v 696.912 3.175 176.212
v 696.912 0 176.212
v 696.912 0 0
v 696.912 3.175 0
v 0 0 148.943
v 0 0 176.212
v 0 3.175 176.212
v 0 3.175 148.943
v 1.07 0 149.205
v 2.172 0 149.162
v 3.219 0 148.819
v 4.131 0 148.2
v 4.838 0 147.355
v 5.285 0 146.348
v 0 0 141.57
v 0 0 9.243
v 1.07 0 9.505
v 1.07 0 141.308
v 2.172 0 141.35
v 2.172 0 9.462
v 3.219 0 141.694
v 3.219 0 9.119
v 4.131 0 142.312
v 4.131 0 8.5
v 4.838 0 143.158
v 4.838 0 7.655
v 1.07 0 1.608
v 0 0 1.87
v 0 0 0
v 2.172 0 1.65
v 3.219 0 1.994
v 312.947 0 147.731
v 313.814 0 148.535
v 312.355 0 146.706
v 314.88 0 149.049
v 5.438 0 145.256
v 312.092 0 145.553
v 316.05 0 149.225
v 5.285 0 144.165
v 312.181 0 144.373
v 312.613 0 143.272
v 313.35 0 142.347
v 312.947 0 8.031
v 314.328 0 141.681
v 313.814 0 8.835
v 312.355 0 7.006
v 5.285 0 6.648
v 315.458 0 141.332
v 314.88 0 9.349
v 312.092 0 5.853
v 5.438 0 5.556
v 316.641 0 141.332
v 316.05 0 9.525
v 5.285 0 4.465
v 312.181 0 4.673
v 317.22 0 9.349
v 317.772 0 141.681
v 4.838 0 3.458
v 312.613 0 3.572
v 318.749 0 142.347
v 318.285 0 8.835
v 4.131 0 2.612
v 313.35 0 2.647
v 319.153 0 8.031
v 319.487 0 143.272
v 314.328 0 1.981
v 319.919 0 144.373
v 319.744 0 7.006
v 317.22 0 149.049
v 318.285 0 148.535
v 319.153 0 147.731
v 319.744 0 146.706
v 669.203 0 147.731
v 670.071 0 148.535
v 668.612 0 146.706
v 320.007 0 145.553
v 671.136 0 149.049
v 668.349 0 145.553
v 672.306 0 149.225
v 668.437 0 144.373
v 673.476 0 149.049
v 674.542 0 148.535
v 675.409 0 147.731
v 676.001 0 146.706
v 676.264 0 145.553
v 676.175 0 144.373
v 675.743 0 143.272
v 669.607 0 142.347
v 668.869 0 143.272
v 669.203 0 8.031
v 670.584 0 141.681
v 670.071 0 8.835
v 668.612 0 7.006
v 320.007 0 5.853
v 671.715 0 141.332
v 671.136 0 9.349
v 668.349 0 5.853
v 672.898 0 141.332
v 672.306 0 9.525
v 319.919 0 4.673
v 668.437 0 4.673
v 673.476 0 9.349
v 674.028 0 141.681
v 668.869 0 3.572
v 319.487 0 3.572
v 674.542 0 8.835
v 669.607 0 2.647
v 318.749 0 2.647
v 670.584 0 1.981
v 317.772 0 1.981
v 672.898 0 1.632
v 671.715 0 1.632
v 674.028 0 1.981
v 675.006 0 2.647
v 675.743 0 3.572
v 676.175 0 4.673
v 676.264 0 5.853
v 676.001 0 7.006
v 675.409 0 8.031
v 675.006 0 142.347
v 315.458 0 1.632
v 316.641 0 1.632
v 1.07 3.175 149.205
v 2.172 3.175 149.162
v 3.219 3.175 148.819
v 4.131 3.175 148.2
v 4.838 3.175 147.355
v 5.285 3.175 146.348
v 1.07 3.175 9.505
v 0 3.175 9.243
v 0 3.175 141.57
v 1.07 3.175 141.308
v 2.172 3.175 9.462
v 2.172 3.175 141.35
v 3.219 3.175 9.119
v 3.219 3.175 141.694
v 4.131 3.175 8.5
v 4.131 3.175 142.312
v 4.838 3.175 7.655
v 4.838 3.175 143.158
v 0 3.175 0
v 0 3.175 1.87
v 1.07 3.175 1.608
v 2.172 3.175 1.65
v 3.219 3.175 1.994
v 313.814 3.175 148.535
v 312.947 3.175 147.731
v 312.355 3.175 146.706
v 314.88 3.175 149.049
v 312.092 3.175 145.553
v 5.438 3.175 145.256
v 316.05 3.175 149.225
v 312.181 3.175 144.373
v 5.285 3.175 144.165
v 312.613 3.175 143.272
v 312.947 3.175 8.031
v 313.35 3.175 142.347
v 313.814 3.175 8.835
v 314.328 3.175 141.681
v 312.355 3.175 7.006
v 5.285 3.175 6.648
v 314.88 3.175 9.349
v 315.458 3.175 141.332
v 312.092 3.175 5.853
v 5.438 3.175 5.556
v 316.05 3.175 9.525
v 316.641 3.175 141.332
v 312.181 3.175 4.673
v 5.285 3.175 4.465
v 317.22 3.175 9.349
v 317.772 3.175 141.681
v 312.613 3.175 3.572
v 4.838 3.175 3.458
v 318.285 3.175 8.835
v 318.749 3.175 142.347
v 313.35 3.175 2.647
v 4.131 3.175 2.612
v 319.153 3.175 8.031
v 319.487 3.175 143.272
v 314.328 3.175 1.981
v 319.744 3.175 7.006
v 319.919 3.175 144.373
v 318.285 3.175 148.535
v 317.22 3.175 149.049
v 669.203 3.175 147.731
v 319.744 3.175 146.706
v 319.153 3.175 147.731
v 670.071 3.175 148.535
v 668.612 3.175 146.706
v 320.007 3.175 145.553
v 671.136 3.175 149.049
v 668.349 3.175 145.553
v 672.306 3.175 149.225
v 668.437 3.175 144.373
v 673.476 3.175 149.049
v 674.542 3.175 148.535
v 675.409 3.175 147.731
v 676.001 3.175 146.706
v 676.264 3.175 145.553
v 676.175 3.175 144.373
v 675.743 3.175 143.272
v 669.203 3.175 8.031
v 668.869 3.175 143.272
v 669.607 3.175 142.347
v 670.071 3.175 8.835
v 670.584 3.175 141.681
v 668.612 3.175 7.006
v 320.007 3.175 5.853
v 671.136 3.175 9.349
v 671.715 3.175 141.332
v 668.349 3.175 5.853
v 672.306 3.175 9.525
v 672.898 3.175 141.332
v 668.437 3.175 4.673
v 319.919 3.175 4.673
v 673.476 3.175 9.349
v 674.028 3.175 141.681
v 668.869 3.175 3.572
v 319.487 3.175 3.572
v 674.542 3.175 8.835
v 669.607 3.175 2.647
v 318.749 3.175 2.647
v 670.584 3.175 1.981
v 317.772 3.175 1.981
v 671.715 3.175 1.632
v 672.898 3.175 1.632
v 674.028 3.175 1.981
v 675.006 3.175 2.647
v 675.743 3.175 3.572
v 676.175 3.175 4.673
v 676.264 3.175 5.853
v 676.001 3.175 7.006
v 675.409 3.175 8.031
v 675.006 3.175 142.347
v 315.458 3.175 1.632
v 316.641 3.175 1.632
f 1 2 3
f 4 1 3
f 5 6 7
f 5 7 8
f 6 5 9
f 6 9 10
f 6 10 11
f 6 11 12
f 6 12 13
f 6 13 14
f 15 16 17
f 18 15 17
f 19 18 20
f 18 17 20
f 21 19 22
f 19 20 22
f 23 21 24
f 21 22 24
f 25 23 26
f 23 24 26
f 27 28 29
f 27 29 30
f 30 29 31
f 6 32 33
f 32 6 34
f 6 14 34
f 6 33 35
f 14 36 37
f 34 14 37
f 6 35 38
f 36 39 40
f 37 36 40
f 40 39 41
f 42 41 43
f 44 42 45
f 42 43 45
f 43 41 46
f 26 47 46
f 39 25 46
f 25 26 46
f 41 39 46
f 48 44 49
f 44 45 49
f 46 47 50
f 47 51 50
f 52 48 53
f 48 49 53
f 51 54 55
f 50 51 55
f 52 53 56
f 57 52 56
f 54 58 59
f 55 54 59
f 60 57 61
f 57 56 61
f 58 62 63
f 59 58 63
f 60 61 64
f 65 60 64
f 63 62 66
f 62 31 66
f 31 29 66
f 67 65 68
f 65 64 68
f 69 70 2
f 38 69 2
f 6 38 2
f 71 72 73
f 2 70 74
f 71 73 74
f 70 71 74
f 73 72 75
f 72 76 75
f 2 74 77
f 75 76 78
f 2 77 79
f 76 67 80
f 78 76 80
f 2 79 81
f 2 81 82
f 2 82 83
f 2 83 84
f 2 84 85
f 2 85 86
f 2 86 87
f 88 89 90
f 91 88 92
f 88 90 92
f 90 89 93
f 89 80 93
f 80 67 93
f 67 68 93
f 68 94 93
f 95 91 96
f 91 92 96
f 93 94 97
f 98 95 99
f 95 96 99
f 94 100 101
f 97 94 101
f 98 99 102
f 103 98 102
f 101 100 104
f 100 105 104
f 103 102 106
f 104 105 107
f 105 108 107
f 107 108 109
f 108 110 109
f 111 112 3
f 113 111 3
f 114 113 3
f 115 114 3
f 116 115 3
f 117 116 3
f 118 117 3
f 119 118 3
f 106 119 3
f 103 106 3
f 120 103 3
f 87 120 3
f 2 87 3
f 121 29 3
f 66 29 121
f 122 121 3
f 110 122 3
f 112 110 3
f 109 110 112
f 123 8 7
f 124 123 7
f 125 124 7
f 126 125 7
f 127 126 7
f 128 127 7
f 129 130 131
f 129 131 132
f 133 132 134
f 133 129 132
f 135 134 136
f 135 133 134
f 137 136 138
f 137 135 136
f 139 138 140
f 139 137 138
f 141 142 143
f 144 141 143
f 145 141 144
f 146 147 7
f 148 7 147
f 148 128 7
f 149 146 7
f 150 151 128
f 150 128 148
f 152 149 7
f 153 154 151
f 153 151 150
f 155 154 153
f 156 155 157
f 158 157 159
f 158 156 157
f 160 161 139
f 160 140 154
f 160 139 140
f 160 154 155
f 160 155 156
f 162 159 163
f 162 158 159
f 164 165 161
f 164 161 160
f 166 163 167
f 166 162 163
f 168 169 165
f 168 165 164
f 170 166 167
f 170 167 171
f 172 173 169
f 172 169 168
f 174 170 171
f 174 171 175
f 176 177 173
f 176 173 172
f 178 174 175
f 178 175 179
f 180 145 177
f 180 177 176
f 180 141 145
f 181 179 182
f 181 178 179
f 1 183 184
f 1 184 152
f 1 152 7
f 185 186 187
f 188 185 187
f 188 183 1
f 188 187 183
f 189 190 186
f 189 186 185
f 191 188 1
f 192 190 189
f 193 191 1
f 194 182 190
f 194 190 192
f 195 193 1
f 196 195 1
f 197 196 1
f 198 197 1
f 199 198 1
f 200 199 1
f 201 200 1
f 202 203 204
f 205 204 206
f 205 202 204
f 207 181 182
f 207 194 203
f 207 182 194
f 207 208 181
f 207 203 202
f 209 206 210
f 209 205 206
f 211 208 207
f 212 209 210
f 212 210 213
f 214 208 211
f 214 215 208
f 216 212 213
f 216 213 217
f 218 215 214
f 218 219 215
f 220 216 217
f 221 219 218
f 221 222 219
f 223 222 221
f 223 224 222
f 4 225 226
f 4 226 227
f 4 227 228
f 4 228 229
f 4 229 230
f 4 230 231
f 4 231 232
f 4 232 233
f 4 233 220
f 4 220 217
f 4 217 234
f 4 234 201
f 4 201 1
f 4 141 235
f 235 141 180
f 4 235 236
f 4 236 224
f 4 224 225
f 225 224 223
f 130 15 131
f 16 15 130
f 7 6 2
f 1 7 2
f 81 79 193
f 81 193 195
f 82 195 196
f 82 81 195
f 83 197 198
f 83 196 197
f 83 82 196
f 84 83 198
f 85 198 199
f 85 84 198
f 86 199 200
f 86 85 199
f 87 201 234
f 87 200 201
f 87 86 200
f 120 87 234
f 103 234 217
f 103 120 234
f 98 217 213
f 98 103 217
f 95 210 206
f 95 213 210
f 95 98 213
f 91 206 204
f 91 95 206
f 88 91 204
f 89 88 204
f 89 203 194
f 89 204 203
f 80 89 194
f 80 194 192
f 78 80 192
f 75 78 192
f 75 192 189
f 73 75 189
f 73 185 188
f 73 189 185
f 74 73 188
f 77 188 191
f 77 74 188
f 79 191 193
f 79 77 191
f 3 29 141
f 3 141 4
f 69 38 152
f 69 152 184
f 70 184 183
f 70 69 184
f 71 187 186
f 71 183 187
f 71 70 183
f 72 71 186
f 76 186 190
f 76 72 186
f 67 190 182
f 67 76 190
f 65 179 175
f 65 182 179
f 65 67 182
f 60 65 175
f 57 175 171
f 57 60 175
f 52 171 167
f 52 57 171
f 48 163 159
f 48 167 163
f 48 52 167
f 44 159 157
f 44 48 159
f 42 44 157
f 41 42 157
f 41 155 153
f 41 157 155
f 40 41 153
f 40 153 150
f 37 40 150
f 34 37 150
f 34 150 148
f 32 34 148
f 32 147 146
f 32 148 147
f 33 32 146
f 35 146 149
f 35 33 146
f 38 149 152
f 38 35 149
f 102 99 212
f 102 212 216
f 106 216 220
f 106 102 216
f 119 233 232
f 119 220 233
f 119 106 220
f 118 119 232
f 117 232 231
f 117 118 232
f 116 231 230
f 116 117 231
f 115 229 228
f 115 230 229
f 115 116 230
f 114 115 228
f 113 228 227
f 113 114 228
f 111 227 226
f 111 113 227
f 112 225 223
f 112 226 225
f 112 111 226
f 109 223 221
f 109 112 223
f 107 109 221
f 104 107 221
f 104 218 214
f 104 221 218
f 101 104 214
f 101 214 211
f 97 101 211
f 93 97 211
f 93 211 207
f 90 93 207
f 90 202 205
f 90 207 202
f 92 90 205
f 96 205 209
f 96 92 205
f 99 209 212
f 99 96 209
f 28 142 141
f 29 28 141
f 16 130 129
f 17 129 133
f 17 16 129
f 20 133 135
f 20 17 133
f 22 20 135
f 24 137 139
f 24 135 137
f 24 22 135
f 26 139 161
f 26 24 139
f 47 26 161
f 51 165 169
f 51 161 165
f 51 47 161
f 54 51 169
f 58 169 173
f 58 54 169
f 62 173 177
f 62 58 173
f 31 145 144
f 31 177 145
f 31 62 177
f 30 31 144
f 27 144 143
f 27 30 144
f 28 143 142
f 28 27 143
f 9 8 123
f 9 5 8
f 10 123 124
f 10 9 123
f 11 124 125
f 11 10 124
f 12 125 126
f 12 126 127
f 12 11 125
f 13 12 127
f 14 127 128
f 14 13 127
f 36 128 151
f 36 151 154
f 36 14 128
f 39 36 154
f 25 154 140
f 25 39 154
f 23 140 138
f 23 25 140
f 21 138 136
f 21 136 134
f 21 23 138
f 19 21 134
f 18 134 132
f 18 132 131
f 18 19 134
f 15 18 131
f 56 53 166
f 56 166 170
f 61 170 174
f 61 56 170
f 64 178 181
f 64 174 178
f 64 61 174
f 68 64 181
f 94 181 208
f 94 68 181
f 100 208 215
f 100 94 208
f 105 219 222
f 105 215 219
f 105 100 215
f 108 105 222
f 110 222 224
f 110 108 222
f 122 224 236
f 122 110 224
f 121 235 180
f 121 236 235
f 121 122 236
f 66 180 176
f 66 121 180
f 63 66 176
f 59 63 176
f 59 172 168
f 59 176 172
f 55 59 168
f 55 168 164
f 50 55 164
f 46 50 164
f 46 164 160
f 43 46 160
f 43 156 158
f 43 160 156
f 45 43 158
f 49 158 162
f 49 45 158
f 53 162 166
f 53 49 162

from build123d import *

# Parameters (mm, degrees)
SKETCH1_W               = 696.9125
SKETCH1_H               = 176.2125
BOSS_EXTRUDE1_DEPTH     = 3.175
CUT_EXTRUDE1_DEPTH      = 400.067894833
CUT_EXTRUDE1_DEPTH_BACK = 400.067894833
SKETCH2_R               = 3.96875


with BuildPart() as part:
    # Sketch1 → Boss-Extrude1 (new body)
    with BuildSketch(Plane(origin=(0, 0, 0), x_dir=(1, 0, 0), z_dir=(0, 1, 0))):
        with Locations((348.45625, -88.10625)):
            Rectangle(SKETCH1_W, SKETCH1_H)
    extrude(amount=BOSS_EXTRUDE1_DEPTH)

    # Sketch2 → Cut-Extrude1 (cut, two sides: drawn at the far end of the back side and taken through both)
    with BuildSketch(Plane(origin=(312.141503281, 3.175, 70.399532245), x_dir=(1, 0, 0), z_dir=(0, 1, 0)).offset(-CUT_EXTRUDE1_DEPTH_BACK)):
        with Locations(Location((360.164746719, 64.843282245, 0), (0, 0, 270))):
            Circle(SKETCH2_R)
        with Locations(Location((360.164746719, -74.856717755, 0), (0, 0, 270))):
            Circle(SKETCH2_R)
        with Locations(Location((3.908296933, 64.843282245, 0), (0, 0, 270))):
            Circle(SKETCH2_R)
        with Locations((-310.672178196, 64.843282245)):
            Circle(SKETCH2_R)
        with Locations(Location((3.908296933, -74.856717755, 0), (0, 0, 270))):
            Circle(SKETCH2_R)
        with Locations((-310.672178196, -74.856717755)):
            Circle(SKETCH2_R)
    extrude(amount=CUT_EXTRUDE1_DEPTH + CUT_EXTRUDE1_DEPTH_BACK, mode=Mode.SUBTRACT)


solid = part.part
